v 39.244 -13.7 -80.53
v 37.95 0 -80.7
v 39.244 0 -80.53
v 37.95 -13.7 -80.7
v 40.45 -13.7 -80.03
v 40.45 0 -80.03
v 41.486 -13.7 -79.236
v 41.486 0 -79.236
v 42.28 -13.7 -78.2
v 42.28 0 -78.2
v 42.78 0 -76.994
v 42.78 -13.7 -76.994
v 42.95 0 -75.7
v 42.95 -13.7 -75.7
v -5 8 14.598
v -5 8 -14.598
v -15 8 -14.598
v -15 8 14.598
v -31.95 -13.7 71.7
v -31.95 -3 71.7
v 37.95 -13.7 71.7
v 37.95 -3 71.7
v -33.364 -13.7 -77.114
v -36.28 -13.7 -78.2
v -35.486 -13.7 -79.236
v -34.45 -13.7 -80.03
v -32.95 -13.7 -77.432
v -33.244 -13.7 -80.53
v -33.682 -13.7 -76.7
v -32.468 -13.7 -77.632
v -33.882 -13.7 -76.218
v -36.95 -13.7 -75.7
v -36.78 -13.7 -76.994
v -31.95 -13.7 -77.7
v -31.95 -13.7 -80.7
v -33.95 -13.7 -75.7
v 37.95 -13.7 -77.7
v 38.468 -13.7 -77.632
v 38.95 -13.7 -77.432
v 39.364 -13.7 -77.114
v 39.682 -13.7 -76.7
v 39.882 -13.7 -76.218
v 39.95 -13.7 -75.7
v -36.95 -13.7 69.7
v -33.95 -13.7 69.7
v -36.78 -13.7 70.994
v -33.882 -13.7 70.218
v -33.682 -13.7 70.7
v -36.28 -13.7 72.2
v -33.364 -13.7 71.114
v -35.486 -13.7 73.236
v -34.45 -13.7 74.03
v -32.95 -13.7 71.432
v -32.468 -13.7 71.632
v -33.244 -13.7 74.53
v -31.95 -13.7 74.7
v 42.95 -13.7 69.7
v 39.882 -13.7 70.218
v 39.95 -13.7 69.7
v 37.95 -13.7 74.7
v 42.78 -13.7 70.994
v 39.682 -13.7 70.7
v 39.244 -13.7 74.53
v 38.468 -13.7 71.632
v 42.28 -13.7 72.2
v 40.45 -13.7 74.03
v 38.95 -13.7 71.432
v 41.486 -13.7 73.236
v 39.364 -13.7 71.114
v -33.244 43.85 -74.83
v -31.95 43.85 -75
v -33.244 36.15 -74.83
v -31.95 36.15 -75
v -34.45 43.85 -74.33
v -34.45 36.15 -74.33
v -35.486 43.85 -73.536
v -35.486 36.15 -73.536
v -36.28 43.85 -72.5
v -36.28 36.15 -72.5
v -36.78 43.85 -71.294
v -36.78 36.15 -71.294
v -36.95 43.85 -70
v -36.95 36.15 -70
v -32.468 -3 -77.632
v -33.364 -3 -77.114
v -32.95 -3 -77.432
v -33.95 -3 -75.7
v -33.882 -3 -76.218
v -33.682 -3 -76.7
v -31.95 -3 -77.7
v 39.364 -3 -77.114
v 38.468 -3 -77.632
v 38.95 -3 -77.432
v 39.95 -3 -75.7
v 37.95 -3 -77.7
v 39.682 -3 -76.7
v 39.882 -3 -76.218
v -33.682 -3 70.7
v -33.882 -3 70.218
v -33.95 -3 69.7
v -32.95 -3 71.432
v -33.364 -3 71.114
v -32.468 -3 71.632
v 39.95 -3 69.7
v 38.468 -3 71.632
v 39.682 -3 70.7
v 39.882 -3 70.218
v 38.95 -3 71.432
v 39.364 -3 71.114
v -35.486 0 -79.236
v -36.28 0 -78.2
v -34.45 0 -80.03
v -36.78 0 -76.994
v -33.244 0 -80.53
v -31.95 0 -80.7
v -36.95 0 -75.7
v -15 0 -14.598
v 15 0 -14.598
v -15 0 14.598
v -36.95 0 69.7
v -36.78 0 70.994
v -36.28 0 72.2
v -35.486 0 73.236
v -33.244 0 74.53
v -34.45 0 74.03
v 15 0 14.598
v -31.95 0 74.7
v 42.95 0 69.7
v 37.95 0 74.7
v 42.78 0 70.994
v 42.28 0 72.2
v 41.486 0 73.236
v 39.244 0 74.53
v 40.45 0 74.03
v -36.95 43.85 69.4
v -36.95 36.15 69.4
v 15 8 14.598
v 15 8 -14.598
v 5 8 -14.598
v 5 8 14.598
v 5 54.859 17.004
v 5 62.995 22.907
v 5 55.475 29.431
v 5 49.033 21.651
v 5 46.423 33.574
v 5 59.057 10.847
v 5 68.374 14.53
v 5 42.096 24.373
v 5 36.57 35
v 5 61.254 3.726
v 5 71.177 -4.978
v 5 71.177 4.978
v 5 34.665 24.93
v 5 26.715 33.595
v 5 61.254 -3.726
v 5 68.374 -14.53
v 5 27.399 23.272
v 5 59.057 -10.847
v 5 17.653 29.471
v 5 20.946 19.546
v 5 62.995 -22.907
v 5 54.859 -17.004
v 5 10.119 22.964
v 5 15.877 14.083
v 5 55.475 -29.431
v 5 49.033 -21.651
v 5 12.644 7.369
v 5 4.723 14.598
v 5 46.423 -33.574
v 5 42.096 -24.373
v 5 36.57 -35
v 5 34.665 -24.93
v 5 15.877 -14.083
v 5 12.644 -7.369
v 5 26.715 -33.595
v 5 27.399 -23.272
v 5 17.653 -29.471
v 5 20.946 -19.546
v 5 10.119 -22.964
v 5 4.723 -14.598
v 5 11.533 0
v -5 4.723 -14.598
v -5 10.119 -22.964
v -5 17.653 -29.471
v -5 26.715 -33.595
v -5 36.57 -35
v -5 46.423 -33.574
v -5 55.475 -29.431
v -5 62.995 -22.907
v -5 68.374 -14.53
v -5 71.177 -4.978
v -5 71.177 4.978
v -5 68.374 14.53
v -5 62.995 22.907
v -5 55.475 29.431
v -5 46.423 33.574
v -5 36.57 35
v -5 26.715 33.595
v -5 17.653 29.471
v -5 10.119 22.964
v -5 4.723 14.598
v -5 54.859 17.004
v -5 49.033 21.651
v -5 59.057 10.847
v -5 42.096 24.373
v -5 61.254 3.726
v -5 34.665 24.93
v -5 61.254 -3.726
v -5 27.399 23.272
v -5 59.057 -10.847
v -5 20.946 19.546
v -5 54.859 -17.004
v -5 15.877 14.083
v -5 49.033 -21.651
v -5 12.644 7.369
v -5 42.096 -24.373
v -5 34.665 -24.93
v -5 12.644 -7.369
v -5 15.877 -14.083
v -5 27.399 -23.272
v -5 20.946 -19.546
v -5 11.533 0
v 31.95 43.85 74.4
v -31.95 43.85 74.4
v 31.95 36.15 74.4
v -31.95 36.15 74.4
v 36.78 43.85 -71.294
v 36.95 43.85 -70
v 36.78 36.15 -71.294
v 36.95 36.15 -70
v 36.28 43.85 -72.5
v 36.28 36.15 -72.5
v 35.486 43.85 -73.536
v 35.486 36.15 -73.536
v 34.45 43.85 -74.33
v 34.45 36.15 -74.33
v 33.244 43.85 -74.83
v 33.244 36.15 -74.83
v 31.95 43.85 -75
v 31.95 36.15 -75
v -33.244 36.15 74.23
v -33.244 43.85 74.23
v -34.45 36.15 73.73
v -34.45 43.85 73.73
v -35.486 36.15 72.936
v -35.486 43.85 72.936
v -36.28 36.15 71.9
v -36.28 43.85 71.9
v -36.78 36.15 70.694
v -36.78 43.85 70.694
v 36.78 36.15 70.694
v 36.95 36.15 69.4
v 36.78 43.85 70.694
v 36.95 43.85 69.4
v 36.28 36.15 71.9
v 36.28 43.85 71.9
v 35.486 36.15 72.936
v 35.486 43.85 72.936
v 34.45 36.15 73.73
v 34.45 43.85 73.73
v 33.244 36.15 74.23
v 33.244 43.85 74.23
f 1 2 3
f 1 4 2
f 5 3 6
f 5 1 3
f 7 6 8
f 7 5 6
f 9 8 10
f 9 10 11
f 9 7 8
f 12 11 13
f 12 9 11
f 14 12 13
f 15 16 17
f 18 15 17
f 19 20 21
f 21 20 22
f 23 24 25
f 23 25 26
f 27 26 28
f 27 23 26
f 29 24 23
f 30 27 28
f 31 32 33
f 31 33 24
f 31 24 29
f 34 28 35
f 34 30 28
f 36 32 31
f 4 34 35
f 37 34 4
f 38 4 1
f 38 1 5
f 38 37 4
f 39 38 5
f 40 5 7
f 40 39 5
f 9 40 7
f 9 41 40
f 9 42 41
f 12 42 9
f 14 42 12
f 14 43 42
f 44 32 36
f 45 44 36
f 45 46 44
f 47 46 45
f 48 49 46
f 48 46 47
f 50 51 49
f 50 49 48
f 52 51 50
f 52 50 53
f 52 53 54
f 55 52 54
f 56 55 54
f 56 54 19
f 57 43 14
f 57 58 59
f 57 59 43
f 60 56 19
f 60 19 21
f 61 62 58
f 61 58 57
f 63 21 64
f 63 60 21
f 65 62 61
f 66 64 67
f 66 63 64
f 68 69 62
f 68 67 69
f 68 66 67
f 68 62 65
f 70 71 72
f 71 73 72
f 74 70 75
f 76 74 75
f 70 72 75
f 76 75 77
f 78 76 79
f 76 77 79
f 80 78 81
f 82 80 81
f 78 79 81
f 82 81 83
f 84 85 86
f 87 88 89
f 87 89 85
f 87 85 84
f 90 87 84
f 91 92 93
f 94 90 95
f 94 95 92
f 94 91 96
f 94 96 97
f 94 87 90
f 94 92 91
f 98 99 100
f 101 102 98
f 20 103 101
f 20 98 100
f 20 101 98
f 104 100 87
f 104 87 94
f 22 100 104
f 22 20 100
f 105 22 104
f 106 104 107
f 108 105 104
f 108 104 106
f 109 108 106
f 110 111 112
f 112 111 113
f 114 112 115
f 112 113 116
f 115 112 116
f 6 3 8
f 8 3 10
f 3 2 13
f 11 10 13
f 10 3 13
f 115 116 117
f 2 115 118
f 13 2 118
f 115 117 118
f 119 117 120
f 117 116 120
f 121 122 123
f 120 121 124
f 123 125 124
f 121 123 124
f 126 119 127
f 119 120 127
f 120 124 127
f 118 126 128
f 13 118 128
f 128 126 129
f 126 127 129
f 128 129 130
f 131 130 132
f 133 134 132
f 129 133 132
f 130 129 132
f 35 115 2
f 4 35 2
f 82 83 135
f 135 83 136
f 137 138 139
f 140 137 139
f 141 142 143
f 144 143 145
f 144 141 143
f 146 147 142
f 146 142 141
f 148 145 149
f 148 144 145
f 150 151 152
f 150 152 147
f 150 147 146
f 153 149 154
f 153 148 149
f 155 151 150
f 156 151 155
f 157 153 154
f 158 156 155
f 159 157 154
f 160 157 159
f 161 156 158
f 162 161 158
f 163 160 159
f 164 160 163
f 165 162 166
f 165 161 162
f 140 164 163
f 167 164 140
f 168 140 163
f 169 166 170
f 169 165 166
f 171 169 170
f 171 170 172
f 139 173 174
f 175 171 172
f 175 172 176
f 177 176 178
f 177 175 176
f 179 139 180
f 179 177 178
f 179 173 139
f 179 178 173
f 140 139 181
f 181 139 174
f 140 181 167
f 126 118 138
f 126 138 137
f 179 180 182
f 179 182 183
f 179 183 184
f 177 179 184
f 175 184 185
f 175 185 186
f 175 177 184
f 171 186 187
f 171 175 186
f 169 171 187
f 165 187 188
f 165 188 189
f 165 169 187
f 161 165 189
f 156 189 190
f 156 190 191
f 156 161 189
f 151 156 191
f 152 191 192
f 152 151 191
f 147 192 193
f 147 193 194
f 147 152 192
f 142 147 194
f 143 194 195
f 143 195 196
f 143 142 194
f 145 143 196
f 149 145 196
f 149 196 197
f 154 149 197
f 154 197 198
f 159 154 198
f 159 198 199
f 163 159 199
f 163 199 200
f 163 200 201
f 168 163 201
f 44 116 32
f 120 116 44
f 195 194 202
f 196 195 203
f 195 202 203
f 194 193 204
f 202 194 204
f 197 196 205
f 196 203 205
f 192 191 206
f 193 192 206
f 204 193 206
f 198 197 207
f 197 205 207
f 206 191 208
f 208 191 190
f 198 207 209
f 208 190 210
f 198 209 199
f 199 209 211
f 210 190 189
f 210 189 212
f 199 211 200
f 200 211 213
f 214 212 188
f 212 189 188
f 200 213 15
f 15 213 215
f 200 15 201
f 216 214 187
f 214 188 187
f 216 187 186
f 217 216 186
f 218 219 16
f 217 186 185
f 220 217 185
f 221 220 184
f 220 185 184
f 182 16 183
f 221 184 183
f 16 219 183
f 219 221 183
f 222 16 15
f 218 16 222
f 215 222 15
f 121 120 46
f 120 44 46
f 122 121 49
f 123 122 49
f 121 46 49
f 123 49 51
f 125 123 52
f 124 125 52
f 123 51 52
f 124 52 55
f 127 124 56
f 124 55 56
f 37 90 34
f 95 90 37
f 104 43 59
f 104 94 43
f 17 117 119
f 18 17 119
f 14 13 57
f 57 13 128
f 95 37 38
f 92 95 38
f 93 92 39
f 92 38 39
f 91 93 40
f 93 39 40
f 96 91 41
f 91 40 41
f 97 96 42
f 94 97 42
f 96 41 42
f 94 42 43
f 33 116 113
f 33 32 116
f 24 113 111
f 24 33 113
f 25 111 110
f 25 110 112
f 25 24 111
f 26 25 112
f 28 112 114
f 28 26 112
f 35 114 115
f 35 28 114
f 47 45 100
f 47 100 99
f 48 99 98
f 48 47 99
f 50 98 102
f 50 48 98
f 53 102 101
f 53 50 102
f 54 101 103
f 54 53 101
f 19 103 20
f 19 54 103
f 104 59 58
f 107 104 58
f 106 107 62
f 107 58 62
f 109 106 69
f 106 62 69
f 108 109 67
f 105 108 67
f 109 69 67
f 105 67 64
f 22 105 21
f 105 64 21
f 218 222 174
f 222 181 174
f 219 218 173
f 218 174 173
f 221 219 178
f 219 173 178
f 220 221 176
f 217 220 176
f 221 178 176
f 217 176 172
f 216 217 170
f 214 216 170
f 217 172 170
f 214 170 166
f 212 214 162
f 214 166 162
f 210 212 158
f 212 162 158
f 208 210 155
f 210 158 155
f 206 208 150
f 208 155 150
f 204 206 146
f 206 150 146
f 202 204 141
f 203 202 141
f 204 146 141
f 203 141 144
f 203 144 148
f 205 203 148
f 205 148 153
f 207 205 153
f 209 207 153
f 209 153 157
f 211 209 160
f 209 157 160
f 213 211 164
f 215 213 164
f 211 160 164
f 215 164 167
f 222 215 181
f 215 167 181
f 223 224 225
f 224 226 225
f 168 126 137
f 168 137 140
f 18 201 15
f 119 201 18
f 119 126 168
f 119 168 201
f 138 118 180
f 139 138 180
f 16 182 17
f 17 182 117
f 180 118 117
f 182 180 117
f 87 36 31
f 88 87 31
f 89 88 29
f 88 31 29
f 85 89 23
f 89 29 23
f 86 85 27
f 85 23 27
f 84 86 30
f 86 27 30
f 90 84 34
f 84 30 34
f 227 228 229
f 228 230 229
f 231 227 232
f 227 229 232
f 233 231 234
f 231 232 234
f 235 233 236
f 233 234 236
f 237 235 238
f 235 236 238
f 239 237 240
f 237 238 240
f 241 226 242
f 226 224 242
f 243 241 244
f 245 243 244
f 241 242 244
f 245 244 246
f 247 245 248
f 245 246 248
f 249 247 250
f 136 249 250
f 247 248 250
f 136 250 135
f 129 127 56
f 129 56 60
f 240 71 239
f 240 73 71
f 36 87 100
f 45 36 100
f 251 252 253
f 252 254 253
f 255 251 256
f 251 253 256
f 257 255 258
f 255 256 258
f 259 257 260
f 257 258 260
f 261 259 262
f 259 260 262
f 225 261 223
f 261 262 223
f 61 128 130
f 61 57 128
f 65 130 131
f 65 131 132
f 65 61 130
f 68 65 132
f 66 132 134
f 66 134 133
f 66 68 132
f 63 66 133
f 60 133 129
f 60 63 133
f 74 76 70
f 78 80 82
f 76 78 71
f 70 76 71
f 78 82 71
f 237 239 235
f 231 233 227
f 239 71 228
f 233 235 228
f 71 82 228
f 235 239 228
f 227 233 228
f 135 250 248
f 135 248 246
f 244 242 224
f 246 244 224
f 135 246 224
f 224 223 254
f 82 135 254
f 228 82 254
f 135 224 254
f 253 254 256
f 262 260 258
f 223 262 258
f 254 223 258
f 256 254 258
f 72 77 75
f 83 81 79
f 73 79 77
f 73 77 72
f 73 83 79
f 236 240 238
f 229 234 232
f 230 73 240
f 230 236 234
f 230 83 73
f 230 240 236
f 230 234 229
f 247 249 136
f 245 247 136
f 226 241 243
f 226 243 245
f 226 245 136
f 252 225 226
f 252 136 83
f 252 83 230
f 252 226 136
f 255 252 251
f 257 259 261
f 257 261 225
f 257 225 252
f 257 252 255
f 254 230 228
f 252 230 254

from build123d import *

# Parameters (mm, degrees)
F0_W      = 73.9
F0_H      = 149.4
F1_DEPTH  = 3.85
F3_R      = 5
F4_R      = 5
F7_W      = 79.9
F7_H      = 155.4
F9_DEPTH  = 13.7
F10_R     = 5
F11_T     = -3
F12_W     = 30
F12_H     = 29.1961848977
F13_DEPTH = 8
F14_W     = 10
F14_H     = 10


with BuildPart() as f1:
    # F0 (on Front) → F1 (new body, symmetric)
    with BuildSketch(Plane.XZ):
        with Locations((0, 74.7)):
            Rectangle(F0_W, F0_H)
    extrude(amount=F1_DEPTH, both=True)


with BuildPart() as f1_1:
    # F2: moved
    add(f1.part.moved(Location((0, 0, -75))))

    # F3
    f3_edges = [f1_1.edges().sort_by_distance(p)[0] for p in [
        (36.95, 0, 74.4),
    ]]
    fillet(f3_edges, radius=F3_R)

    # F4
    f4_edges = [f1_1.edges().sort_by_distance(p)[0] for p in [
        (-36.95, 0, 74.4),
        (-36.95, 0, -75),
        (36.95, 0, -75),
    ]]
    fillet(f4_edges, radius=F4_R)


with BuildPart() as f5_1:
    # F5: copy of F1
    add(f1_1.part.moved(Location((0, 23, 0))))


with BuildPart() as f1_2:
    # F8: moved
    add(f1_1.part.moved(Location((0, 40, 0))))


with BuildPart() as f9:
    # F7 (on Front) → F9 (new body)
    with BuildSketch(Plane.XZ):
        with Locations((3, -3)):
            Rectangle(F7_W, F7_H)
    extrude(amount=F9_DEPTH)

    # F10
    f10_edges = [f9.edges().sort_by_distance(p)[0] for p in [
        (-36.95, -6.85, 74.7),
        (42.95, -6.85, 74.7),
        (42.95, -6.85, -80.7),
        (-36.95, -6.85, -80.7),
    ]]
    fillet(f10_edges, radius=F10_R)

    # F11
    f11_openings = [f9.faces().sort_by_distance(p)[0] for p in [
        (3, -13.7, -3),
    ]]
    offset(amount=F11_T, openings=f11_openings)

    # F12 (on face) → F13 (join)
    with BuildSketch(Plane(origin=(0, 0, 0), x_dir=(-1, 0, 0), z_dir=(0, 1, 0))):
        Rectangle(F12_W, F12_H)
    extrude(amount=F13_DEPTH)

    # F14 (on Top) → F15 (revolve)
    with BuildSketch(Plane.XY):
        with Locations((0, 6.5329223871)):
            Rectangle(F14_W, F14_H)
    revolve(axis=Axis((-0.3910209052, 36.5329223871, 0), (1, 0, 0)))


solid = Compound([f1_2.part, f9.part])
